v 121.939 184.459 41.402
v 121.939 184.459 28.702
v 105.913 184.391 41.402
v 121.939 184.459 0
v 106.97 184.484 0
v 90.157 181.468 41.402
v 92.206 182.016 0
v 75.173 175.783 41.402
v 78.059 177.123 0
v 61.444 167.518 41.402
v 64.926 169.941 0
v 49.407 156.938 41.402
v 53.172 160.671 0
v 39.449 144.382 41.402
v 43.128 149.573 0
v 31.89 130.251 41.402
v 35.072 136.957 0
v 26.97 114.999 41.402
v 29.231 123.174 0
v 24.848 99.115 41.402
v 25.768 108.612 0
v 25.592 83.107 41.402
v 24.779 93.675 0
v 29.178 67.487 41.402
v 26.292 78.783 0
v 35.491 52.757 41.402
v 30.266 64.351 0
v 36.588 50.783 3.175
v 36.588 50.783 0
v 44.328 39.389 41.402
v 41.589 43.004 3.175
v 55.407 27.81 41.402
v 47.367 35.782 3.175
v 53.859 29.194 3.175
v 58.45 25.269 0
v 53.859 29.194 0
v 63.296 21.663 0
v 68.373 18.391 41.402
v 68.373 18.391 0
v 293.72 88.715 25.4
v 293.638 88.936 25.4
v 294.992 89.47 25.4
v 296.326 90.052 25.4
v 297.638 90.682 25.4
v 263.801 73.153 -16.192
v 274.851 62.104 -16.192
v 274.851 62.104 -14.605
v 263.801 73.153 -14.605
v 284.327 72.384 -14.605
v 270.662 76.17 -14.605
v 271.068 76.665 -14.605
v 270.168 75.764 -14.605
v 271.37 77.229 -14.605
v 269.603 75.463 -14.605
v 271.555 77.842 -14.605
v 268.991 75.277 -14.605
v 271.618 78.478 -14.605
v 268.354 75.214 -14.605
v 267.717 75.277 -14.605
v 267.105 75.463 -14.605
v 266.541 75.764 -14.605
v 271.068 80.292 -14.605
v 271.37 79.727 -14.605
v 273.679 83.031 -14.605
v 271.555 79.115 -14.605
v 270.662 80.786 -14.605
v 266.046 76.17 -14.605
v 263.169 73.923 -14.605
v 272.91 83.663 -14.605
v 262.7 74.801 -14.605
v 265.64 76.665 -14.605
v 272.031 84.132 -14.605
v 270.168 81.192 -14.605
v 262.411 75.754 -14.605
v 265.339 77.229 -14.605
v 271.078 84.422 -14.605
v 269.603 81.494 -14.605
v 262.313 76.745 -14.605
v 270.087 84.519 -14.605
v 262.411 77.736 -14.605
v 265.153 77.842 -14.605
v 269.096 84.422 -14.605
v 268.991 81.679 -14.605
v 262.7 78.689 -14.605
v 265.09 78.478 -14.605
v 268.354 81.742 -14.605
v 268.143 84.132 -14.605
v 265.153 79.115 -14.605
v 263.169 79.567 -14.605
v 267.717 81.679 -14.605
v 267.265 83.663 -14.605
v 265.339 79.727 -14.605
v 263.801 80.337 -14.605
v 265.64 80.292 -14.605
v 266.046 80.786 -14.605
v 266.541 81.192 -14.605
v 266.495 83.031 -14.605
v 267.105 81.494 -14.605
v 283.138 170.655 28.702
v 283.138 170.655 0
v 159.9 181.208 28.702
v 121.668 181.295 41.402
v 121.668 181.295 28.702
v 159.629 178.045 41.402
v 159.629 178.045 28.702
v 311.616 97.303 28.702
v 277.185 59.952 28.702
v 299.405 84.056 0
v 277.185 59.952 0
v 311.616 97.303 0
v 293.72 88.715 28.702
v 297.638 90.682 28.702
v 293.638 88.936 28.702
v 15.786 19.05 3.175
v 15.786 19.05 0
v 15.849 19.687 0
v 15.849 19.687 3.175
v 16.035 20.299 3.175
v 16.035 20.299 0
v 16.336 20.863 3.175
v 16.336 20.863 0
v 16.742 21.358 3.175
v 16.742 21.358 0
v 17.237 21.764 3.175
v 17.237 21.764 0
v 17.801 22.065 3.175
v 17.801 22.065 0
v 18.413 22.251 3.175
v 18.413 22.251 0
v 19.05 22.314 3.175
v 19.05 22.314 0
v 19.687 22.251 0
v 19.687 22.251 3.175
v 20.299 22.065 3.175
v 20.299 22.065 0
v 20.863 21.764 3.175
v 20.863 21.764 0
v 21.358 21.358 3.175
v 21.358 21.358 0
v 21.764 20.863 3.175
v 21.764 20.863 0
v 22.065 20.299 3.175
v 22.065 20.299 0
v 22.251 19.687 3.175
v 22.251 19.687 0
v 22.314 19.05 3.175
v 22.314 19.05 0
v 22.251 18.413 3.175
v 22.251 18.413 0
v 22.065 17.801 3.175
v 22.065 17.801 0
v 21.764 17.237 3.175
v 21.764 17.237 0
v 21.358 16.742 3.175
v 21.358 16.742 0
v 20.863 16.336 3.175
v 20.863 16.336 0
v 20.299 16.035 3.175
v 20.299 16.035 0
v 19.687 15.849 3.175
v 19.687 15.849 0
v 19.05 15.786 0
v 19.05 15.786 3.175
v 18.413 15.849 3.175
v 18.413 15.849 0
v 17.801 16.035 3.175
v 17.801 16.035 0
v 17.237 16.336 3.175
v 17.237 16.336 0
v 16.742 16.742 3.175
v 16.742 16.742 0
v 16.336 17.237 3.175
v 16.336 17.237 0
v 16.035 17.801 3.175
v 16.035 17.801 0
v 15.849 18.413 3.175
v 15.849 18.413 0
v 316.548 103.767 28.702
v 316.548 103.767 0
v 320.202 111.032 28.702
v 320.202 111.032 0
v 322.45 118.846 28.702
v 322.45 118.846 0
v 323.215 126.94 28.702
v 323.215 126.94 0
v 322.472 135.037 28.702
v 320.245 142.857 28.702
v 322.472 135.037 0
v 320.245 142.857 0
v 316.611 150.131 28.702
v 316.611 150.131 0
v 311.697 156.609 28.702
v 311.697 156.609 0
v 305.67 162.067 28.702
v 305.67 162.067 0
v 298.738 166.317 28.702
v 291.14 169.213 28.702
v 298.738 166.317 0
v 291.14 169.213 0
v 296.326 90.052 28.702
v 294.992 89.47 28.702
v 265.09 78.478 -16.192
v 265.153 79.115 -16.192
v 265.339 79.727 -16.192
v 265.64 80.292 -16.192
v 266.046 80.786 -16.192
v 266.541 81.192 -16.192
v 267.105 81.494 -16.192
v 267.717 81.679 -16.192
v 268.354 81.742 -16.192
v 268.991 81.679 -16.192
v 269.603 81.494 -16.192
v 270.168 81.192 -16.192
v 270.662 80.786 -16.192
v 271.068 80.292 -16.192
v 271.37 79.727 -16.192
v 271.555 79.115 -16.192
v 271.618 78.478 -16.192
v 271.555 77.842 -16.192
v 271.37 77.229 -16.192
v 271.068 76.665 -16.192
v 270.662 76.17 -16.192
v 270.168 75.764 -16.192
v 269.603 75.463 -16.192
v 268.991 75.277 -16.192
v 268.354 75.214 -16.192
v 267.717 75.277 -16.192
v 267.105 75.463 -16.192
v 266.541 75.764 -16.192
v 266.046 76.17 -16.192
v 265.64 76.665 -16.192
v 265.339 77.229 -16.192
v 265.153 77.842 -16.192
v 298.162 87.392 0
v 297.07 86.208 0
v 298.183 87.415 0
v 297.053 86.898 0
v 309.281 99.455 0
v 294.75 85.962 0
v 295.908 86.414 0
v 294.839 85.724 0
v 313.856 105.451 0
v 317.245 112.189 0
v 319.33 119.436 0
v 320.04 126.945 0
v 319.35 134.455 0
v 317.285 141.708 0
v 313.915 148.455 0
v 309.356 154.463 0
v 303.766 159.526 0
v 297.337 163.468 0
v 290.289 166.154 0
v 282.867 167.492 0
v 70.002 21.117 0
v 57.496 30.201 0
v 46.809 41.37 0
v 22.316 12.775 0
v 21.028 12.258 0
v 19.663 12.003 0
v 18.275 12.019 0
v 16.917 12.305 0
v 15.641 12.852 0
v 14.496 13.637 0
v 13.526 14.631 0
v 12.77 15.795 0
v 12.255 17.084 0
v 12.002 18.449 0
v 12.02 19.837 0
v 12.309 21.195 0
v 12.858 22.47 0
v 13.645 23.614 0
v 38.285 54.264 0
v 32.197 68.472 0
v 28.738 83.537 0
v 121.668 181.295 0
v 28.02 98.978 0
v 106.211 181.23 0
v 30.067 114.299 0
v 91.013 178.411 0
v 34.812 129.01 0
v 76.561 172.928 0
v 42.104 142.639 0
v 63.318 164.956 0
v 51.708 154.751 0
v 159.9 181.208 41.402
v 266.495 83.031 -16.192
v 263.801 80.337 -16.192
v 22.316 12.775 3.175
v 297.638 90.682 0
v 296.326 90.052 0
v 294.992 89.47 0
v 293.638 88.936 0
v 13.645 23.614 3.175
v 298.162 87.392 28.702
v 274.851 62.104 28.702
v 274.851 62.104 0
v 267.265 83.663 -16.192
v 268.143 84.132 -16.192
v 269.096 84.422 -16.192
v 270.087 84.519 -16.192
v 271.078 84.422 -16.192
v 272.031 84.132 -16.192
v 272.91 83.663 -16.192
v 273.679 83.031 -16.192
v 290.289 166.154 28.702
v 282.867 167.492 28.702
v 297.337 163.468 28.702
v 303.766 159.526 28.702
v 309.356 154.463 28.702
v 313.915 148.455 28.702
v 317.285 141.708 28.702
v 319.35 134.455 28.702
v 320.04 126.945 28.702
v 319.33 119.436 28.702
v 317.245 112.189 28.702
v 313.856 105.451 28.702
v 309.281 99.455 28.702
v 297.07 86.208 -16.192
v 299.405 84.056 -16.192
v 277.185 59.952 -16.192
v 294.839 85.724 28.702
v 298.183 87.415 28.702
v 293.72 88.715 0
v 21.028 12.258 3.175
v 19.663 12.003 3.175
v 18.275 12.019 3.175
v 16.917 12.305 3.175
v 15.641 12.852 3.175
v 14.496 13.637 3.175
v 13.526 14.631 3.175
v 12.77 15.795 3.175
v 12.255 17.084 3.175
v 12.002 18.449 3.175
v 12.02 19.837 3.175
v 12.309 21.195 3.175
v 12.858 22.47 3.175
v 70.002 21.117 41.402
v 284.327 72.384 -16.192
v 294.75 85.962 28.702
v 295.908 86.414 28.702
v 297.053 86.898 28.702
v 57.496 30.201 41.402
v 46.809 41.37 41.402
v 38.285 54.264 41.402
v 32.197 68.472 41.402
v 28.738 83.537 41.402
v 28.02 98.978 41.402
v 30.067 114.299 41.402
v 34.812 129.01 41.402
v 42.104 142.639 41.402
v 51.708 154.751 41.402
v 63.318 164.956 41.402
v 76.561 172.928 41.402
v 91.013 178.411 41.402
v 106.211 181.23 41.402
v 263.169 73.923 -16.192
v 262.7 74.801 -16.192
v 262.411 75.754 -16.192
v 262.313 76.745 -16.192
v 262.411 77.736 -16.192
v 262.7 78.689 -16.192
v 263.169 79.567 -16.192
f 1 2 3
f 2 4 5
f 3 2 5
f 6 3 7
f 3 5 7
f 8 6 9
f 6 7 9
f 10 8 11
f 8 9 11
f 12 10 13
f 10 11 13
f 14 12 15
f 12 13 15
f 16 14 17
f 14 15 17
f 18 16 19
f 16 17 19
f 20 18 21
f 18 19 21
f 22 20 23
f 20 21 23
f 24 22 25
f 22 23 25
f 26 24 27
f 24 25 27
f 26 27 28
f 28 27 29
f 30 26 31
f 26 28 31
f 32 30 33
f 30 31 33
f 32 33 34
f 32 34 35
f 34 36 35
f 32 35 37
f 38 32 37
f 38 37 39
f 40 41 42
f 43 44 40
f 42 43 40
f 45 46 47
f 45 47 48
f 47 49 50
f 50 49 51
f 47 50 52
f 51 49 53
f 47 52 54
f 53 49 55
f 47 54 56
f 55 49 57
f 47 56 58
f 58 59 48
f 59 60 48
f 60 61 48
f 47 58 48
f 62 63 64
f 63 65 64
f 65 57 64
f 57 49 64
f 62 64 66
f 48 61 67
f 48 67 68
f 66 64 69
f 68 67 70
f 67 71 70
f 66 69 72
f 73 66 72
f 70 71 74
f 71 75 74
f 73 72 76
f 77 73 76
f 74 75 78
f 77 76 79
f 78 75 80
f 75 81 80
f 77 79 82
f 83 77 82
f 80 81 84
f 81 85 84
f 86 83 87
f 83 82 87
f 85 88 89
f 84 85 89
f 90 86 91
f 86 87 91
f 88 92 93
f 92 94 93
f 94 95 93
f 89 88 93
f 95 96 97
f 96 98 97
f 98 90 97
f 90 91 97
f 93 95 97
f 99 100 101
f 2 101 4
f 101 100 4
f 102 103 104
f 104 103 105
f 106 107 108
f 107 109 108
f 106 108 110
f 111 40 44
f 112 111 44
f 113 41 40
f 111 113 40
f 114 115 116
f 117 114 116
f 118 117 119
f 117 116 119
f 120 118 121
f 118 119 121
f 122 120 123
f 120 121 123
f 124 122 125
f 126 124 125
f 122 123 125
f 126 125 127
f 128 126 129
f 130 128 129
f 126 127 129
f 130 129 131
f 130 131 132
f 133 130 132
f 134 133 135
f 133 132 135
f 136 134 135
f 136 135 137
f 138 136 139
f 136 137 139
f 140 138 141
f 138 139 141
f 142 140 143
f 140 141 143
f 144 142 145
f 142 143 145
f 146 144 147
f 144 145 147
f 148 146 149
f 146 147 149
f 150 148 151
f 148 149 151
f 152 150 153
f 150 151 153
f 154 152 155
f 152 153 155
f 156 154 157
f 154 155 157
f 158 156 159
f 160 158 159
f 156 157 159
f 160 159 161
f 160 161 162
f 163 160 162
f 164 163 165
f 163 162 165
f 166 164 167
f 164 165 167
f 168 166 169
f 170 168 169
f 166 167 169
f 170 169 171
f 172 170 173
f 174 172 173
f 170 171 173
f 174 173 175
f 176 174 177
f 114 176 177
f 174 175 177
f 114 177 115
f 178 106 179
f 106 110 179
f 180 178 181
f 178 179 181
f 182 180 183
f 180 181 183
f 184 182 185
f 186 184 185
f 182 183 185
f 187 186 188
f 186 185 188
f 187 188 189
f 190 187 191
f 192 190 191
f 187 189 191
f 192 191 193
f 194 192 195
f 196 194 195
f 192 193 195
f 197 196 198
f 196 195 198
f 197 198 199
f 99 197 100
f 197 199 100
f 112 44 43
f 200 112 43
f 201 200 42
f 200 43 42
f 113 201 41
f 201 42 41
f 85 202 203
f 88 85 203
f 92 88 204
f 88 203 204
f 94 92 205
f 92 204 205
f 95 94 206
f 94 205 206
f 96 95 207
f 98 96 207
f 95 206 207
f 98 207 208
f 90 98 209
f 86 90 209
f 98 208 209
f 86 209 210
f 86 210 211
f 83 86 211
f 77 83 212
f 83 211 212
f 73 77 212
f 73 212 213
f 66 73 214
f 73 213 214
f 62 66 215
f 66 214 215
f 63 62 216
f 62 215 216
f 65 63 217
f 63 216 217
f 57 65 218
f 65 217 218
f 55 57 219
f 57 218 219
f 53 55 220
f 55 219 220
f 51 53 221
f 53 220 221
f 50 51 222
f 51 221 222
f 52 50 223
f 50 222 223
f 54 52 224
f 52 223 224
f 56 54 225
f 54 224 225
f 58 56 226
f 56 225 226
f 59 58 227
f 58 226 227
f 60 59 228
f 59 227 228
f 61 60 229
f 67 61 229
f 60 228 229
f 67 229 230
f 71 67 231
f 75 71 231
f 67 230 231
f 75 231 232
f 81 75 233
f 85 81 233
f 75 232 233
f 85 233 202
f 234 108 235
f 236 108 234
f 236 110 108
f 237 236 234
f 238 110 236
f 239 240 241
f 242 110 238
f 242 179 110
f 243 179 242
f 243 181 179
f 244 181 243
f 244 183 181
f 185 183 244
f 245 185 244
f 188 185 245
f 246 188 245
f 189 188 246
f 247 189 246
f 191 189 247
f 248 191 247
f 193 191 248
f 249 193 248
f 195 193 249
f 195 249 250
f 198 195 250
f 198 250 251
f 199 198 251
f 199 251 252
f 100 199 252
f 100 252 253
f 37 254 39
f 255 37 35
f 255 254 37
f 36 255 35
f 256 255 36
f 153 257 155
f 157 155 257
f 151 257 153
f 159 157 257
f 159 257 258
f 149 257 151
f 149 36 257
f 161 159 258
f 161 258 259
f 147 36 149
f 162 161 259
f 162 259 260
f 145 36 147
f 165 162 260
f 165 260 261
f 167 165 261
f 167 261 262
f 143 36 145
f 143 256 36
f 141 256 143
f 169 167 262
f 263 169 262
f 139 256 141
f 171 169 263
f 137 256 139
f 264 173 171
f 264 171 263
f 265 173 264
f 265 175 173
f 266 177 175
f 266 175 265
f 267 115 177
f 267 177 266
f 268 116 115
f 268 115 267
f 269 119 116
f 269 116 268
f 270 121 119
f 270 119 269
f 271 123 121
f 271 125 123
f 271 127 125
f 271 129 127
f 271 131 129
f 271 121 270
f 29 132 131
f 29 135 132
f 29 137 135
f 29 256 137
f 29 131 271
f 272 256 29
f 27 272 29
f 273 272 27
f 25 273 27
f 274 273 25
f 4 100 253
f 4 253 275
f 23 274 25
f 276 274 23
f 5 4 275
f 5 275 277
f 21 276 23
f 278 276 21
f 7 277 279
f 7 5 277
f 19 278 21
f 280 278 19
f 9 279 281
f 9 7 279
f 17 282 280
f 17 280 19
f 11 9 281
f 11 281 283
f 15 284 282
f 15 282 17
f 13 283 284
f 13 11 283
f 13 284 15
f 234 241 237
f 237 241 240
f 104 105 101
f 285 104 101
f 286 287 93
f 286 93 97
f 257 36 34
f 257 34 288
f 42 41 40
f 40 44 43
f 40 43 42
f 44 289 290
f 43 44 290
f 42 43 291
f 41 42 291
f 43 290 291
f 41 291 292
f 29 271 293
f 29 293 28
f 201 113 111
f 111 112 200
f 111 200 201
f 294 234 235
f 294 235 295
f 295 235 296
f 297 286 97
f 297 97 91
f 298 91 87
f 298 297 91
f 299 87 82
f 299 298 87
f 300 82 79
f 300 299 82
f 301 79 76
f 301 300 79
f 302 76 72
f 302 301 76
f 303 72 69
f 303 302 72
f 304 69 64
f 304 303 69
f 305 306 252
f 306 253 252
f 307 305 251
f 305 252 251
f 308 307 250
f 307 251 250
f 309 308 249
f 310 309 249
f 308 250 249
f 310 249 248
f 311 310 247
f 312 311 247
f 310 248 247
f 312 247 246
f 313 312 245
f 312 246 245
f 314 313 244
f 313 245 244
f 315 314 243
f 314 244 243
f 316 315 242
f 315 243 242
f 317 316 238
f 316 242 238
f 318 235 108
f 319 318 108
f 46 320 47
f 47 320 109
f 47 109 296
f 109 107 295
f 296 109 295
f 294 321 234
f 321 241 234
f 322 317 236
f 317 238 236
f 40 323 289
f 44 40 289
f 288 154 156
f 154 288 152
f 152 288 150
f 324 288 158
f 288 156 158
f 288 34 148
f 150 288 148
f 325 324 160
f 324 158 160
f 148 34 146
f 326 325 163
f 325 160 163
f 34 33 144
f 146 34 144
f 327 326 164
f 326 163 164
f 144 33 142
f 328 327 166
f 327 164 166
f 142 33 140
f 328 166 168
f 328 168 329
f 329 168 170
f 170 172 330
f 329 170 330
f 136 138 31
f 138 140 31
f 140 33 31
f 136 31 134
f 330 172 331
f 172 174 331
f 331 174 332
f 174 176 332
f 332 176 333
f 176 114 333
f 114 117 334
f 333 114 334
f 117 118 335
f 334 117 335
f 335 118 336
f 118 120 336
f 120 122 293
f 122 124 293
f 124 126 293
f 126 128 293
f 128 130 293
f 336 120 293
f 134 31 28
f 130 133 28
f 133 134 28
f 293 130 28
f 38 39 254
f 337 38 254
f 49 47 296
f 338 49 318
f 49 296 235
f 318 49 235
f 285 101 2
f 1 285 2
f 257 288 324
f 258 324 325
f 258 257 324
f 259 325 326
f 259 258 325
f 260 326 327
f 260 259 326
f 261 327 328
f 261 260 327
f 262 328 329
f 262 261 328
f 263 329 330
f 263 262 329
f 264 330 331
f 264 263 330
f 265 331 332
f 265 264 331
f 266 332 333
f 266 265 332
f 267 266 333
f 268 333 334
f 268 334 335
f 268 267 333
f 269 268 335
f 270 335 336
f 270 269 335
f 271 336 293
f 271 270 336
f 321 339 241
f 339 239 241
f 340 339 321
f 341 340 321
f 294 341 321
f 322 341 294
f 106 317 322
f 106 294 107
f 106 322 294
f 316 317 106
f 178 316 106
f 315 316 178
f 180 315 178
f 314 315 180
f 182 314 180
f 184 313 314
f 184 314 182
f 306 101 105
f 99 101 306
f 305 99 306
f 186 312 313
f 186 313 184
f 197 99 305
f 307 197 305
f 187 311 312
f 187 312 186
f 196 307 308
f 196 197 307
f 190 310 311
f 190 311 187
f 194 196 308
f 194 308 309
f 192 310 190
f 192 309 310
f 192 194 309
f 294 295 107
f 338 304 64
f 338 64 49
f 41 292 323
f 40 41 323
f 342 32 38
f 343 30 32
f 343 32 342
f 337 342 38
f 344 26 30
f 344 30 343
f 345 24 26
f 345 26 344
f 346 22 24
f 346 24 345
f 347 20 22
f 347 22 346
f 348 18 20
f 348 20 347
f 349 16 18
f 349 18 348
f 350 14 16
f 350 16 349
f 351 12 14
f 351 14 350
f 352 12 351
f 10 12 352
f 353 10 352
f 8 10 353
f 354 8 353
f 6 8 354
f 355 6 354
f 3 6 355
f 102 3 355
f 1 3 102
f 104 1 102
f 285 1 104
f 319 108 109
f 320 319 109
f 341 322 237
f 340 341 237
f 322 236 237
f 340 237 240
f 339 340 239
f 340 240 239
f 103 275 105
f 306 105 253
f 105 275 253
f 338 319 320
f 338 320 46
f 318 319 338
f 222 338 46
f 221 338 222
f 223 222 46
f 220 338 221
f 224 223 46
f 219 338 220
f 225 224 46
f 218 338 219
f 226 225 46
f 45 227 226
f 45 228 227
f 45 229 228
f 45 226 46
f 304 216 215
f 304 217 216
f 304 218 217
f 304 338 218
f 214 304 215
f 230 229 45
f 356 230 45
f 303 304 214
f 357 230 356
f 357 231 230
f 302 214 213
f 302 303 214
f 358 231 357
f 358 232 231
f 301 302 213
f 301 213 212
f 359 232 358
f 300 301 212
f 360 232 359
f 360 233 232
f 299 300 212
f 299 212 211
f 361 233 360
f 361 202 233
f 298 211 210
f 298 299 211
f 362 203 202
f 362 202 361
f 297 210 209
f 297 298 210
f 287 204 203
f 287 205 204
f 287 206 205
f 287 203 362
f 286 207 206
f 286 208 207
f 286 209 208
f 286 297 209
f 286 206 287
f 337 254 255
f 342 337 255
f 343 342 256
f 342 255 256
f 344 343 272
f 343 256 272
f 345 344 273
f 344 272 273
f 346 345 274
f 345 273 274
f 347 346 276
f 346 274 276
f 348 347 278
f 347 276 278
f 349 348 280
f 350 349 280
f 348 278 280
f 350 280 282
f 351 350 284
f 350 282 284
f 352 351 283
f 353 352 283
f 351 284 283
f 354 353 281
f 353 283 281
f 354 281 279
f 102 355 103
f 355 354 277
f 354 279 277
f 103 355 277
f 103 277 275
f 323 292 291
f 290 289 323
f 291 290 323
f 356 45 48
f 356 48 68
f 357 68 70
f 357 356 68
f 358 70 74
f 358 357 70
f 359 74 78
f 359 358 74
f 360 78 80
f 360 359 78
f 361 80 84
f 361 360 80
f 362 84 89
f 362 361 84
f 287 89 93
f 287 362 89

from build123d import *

# Parameters (mm, degrees)
BOSS_EXTRUDE1_DEPTH   = 25.4
BOSS_EXTRUDE1_2_DEPTH = 25.4
SKETCH2_R             = 7.0739
SKETCH2_R_2           = 3.2639
BOSS_EXTRUDE2_DEPTH   = 3.175
BOSS_EXTRUDE3_DEPTH   = 3.302
BOSS_EXTRUDE4_DEPTH   = 12.7
BOSS_EXTRUDE5_DEPTH   = 16.1925
SKETCH6_R             = 3.2639
BOSS_EXTRUDE6_DEPTH   = 1.5875


with BuildPart() as part:
    # Sketch1 → Boss-Extrude1 (new body)
    with BuildSketch(Plane.XY):
        with BuildLine():
            ThreePointArc((70.001721328, 21.116929737), (32.109818913, 121.760822938), (121.667937999, 181.295122405))
            Line((121.667937999, 181.295122405), (282.867264941, 167.491822308))
            ThreePointArc((282.867264941, 167.491822308), (317.285019746, 141.708326855), (309.281467912, 99.455354869))
            Line((309.281467912, 99.455354869), (298.182872237, 87.415180491))
            ThreePointArc((298.182872237, 87.415180491), (296.481974793, 86.652009193), (294.750152503, 85.961883046))
            Line((294.750152503, 85.961883046), (294.839214659, 85.723778364))
            Line((294.839214659, 85.723778364), (298.161838441, 87.392362238))
            Line((298.161838441, 87.392362238), (274.850661498, 62.103519979))
            Line((274.850661498, 62.103519979), (277.185151179, 59.951594578))
            Line((277.185151179, 59.951594578), (311.615957593, 97.303429468))
            ThreePointArc((311.615957593, 97.303429468), (320.244786914, 142.85741489), (283.138145015, 170.655245926))
            Line((283.138145015, 170.655245926), (121.938818073, 184.458546023))
            ThreePointArc((121.938818073, 184.458546023), (29.088121079, 122.735485546), (68.373108141, 18.391449213))
            Line((68.373108141, 18.391449213), (70.001721328, 21.116929737))
        make_face()
    extrude(amount=BOSS_EXTRUDE1_DEPTH)

    # Sketch2 → Boss-Extrude2 (add)
    # profile 1 of 2: a face of its own
    with BuildSketch(Plane(origin=(0, 0, 0), x_dir=(-1, 0, 0), z_dir=(0, 0, -1))):
        with BuildLine():
            ThreePointArc((-36.587701927, 50.782990283), (-44.384911147, 39.317928918), (-53.858754358, 29.194174745))
            Line((-53.858754358, 29.194174745), (-22.316186857, 12.775282108))
            ThreePointArc((-22.316186857, 12.775282108), (-23.932636358, 13.931413925), (-25.163710326, 15.491544259))
            ThreePointArc((-25.163710326, 15.491544259), (-23.930769686, 24.17036605), (-15.202863294, 24.986295173))
            ThreePointArc((-15.202863294, 24.986295173), (-14.373460165, 24.357545231), (-13.645291854, 23.613900861))
            Line((-13.645291854, 23.613900861), (-36.587701927, 50.782990283))
        make_face()
    # profile 2 of 2: a face of its own
    with BuildSketch(Plane(origin=(0, 0, 0), x_dir=(-1, 0, 0), z_dir=(0, 0, -1))):
        with Locations((-19.05, 19.05)):
            Circle(SKETCH2_R)
        with Locations((-19.05, 19.05)):
            Circle(SKETCH2_R_2, mode=Mode.SUBTRACT)
    extrude(amount=-BOSS_EXTRUDE2_DEPTH)

    # Sketch3 → Boss-Extrude3 (add)
    with BuildSketch(Plane.XY.offset(25.4)):
        with BuildLine():
            Line((68.373108141, 18.391449213), (70.001721328, 21.116929737))
            ThreePointArc((70.001721328, 21.116929737), (32.109818913, 121.760822938), (121.667937999, 181.295122405))
            Line((121.667937999, 181.295122405), (282.867264941, 167.491822308))
            ThreePointArc((282.867264941, 167.491822308), (317.285019746, 141.708326855), (309.281467912, 99.455354869))
            Line((309.281467912, 99.455354869), (298.182872237, 87.415180491))
            ThreePointArc((298.182872237, 87.415180491), (296.481974793, 86.652009193), (294.750152503, 85.961883046))
            Line((294.750152503, 85.961883046), (294.839214659, 85.723778364))
            Line((294.839214659, 85.723778364), (298.161838441, 87.392362238))
            Line((298.161838441, 87.392362238), (274.850661498, 62.103519979))
            Line((274.850661498, 62.103519979), (277.185151179, 59.951594578))
            Line((277.185151179, 59.951594578), (311.615957593, 97.303429468))
            ThreePointArc((311.615957593, 97.303429468), (320.244786914, 142.85741489), (283.138145015, 170.655245926))
            Line((283.138145015, 170.655245926), (121.938818073, 184.458546023))
            ThreePointArc((121.938818073, 184.458546023), (29.088121079, 122.735485546), (68.373108141, 18.391449213))
        make_face()
        with BuildLine():
            Line((293.637822612, 88.935659637), (293.720430988, 88.714808918))
            Line((293.720430988, 88.714808918), (297.638321365, 90.682328905))
            ThreePointArc((297.638321365, 90.682328905), (295.661540372, 89.755243259), (293.637822612, 88.935659637))
        make_face()
    extrude(amount=BOSS_EXTRUDE3_DEPTH)


with BuildPart() as body_2:
    # Sketch1 → Boss-Extrude1 2 (new body)
    with BuildSketch(Plane.XY):
        with BuildLine():
            ThreePointArc((297.638321365, 90.682328905), (295.661540372, 89.755243259), (293.637822612, 88.935659637))
            Line((293.637822612, 88.935659637), (293.720430988, 88.714808918))
            Line((293.720430988, 88.714808918), (297.638321365, 90.682328905))
        make_face()
    extrude(amount=BOSS_EXTRUDE1_2_DEPTH)


with BuildPart() as boss_extrude3_piece_1:
    # of the separate pieces the step leaves, piece 1, a body of its own (boss_extrude3_pieces)
    add(part.part.solids().sort_by_distance((70.001721328, 21.116929737, 28.702))[0])

    # Sketch4 → Boss-Extrude4 (add)
    with BuildSketch(Plane.XY.offset(28.702)):
        with BuildLine():
            Line((121.667937999, 181.295122405), (159.629021413, 178.044561523))
            Line((159.629021413, 178.044561523), (159.899901487, 181.207985141))
            Line((159.899901487, 181.207985141), (121.938818073, 184.458546023))
            ThreePointArc((121.938818073, 184.458546023), (29.088121079, 122.735485546), (68.373108141, 18.391449213))
            Line((68.373108141, 18.391449213), (70.001721328, 21.116929737))
            ThreePointArc((70.001721328, 21.116929737), (32.109818913, 121.760822938), (121.667937999, 181.295122405))
        make_face()
    extrude(amount=BOSS_EXTRUDE4_DEPTH)

    # Sketch5 → Boss-Extrude5 (add)
    with BuildSketch(Plane(origin=(0, 0, 0), x_dir=(-1, 0, 0), z_dir=(0, 0, -1))):
        Polygon((-277.185151179, 59.951594578), (-274.850661498, 62.103519979), (-297.070096233, 86.207999194), (-299.404585914, 84.056073793), align=None)
    extrude(amount=BOSS_EXTRUDE5_DEPTH)

    # Sketch6 → Boss-Extrude6 (add)
    with BuildSketch(Plane(origin=(0, 0, -16.1925), x_dir=(-1, 0, 0), z_dir=(0, 0, -1))):
        with BuildLine():
            Line((-274.850661498, 62.103519979), (-263.801215322, 73.152966154))
            ThreePointArc((-263.801215322, 73.152966154), (-262.313317771, 76.745068603), (-263.801215322, 80.337171051))
            Line((-263.801215322, 80.337171051), (-266.495292159, 83.031247888))
            ThreePointArc((-266.495292159, 83.031247888), (-270.087394607, 84.519145439), (-273.679497055, 83.031247888))
            Line((-273.679497055, 83.031247888), (-284.326969415, 72.383775528))
            Line((-284.326969415, 72.383775528), (-274.850661498, 62.103519979))
        make_face()
        with Locations((-268.354205176, 78.478258034)):
            Circle(SKETCH6_R, mode=Mode.SUBTRACT)
    extrude(amount=-BOSS_EXTRUDE6_DEPTH)


with BuildPart() as boss_extrude3_piece_2:
    # of the separate pieces the step leaves, piece 2, a body of its own (boss_extrude3_pieces)
    add(part.part.solids().sort_by_distance((293.637822612, 88.935659637, 25.4))[0])


solid = Compound([body_2.part, boss_extrude3_piece_1.part, boss_extrude3_piece_2.part])
